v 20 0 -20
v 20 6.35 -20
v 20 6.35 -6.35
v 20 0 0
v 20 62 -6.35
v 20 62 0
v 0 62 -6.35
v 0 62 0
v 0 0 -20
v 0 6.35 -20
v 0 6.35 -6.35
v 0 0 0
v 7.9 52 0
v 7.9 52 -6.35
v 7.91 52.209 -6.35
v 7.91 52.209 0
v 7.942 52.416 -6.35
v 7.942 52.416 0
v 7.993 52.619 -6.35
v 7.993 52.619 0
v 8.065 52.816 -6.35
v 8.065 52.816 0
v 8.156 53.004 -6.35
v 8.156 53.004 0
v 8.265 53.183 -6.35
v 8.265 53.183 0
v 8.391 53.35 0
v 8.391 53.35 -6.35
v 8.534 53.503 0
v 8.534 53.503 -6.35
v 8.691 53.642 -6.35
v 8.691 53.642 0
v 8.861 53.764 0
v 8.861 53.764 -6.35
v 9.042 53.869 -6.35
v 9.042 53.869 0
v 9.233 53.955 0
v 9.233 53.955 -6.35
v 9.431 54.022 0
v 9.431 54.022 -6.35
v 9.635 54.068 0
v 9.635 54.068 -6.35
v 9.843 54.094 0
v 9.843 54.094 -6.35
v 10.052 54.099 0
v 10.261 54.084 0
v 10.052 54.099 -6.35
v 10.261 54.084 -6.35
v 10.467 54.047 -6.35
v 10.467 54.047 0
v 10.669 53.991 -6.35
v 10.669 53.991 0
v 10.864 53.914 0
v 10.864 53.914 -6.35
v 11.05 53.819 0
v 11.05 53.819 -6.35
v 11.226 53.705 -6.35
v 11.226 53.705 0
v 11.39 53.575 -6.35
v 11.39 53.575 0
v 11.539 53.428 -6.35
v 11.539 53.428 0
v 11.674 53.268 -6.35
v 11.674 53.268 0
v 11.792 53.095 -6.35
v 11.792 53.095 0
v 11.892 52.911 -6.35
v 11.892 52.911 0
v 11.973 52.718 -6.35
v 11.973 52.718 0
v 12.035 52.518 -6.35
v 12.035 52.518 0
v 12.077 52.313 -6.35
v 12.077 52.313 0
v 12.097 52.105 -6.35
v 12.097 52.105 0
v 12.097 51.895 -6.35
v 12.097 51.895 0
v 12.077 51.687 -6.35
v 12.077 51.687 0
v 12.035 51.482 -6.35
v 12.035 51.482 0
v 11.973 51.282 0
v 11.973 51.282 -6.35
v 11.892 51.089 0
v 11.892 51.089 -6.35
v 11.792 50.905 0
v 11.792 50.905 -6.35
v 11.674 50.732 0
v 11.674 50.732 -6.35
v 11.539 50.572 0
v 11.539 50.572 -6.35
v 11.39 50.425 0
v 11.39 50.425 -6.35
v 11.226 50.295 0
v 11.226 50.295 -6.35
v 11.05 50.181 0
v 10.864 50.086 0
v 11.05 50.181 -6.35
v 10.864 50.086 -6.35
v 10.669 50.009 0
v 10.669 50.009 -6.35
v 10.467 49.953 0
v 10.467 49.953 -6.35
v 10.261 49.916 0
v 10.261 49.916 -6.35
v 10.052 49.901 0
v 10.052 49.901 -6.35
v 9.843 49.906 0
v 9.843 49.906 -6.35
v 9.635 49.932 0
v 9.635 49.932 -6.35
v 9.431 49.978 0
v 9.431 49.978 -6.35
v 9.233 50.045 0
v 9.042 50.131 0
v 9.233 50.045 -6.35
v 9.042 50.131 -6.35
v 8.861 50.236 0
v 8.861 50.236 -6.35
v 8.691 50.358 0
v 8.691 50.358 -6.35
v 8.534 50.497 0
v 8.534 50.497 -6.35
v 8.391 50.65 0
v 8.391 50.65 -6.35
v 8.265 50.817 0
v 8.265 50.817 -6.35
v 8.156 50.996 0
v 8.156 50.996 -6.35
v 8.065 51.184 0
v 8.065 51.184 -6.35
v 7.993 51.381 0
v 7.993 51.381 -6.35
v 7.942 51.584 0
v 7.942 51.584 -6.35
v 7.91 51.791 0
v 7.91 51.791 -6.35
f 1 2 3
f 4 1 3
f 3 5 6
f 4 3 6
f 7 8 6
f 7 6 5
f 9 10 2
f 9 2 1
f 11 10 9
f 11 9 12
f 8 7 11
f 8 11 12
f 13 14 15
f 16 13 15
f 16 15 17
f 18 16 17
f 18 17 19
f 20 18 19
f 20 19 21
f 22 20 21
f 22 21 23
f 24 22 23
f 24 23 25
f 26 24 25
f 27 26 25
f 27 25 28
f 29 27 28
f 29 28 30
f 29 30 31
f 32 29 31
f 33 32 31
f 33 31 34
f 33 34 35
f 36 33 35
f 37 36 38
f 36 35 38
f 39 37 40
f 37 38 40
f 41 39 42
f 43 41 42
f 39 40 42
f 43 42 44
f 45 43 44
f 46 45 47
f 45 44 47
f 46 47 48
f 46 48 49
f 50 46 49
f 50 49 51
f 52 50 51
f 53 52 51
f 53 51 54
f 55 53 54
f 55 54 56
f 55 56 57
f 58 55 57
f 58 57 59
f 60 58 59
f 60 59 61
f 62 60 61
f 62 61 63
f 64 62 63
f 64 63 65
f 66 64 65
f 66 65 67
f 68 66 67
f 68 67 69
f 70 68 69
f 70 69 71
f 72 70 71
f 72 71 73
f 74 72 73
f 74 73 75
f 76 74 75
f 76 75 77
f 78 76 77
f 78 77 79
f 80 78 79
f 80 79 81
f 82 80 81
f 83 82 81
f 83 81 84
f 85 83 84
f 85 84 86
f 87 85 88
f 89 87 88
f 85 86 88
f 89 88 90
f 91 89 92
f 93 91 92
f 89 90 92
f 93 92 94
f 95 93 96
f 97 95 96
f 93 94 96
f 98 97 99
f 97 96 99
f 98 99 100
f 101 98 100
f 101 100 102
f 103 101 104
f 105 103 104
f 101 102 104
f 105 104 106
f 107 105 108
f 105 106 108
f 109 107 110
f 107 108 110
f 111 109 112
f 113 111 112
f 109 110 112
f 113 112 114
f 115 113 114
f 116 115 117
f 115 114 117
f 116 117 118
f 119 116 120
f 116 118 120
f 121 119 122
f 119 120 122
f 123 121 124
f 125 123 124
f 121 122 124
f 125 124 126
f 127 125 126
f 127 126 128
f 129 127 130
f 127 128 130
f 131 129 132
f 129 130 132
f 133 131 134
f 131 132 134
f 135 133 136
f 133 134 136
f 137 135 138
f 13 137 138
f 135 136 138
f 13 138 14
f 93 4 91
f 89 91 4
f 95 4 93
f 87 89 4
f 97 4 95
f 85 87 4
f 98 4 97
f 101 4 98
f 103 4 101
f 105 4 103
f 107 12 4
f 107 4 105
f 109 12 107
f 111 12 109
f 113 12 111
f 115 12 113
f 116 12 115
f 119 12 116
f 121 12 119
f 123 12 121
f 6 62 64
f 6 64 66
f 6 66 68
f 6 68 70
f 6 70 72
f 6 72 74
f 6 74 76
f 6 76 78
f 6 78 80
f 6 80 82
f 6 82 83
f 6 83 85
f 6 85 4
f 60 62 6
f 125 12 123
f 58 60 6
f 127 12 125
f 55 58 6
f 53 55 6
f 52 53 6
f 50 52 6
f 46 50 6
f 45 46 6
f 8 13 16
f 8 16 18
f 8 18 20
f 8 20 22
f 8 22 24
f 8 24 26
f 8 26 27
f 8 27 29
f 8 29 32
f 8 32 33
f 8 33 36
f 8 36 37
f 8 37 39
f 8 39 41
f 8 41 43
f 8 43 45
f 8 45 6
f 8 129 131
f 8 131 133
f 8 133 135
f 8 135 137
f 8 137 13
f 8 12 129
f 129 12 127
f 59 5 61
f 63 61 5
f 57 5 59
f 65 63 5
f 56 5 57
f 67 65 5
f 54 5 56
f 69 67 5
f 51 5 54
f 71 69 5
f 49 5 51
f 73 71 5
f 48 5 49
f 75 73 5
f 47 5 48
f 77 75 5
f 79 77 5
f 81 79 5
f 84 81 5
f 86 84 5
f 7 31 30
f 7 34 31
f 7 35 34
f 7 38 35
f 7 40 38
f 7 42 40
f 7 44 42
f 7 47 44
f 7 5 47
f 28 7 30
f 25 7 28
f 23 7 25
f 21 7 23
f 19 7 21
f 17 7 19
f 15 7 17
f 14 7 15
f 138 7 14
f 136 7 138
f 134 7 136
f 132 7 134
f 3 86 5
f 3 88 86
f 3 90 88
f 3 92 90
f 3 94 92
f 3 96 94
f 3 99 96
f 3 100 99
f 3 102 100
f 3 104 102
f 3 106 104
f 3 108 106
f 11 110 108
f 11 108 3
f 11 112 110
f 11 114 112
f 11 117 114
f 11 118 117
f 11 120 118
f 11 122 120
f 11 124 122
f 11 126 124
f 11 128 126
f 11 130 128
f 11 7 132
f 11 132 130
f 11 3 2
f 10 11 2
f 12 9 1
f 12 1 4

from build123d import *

# Parameters (mm, degrees)
BOSS_EXTRUDE1_DEPTH = 20
M5_TAPPED_HOLE1_D   = 4.2


with BuildPart() as part:
    # Sketch1 → Boss-Extrude1 (new body)
    with BuildSketch(Plane(origin=(0, 0, 0), x_dir=(0, 0, -1), z_dir=(1, 0, 0))):
        Polygon((0, 0), (0, 62), (6.35, 62), (6.35, 6.35), (20, 6.35), (20, 0), align=None)
    extrude(amount=BOSS_EXTRUDE1_DEPTH)

    # M5 Tapped Hole1 (through all)
    with Locations(Plane.XY):
        with Locations((10, 52)):
            Hole(M5_TAPPED_HOLE1_D / 2)


solid = part.part
